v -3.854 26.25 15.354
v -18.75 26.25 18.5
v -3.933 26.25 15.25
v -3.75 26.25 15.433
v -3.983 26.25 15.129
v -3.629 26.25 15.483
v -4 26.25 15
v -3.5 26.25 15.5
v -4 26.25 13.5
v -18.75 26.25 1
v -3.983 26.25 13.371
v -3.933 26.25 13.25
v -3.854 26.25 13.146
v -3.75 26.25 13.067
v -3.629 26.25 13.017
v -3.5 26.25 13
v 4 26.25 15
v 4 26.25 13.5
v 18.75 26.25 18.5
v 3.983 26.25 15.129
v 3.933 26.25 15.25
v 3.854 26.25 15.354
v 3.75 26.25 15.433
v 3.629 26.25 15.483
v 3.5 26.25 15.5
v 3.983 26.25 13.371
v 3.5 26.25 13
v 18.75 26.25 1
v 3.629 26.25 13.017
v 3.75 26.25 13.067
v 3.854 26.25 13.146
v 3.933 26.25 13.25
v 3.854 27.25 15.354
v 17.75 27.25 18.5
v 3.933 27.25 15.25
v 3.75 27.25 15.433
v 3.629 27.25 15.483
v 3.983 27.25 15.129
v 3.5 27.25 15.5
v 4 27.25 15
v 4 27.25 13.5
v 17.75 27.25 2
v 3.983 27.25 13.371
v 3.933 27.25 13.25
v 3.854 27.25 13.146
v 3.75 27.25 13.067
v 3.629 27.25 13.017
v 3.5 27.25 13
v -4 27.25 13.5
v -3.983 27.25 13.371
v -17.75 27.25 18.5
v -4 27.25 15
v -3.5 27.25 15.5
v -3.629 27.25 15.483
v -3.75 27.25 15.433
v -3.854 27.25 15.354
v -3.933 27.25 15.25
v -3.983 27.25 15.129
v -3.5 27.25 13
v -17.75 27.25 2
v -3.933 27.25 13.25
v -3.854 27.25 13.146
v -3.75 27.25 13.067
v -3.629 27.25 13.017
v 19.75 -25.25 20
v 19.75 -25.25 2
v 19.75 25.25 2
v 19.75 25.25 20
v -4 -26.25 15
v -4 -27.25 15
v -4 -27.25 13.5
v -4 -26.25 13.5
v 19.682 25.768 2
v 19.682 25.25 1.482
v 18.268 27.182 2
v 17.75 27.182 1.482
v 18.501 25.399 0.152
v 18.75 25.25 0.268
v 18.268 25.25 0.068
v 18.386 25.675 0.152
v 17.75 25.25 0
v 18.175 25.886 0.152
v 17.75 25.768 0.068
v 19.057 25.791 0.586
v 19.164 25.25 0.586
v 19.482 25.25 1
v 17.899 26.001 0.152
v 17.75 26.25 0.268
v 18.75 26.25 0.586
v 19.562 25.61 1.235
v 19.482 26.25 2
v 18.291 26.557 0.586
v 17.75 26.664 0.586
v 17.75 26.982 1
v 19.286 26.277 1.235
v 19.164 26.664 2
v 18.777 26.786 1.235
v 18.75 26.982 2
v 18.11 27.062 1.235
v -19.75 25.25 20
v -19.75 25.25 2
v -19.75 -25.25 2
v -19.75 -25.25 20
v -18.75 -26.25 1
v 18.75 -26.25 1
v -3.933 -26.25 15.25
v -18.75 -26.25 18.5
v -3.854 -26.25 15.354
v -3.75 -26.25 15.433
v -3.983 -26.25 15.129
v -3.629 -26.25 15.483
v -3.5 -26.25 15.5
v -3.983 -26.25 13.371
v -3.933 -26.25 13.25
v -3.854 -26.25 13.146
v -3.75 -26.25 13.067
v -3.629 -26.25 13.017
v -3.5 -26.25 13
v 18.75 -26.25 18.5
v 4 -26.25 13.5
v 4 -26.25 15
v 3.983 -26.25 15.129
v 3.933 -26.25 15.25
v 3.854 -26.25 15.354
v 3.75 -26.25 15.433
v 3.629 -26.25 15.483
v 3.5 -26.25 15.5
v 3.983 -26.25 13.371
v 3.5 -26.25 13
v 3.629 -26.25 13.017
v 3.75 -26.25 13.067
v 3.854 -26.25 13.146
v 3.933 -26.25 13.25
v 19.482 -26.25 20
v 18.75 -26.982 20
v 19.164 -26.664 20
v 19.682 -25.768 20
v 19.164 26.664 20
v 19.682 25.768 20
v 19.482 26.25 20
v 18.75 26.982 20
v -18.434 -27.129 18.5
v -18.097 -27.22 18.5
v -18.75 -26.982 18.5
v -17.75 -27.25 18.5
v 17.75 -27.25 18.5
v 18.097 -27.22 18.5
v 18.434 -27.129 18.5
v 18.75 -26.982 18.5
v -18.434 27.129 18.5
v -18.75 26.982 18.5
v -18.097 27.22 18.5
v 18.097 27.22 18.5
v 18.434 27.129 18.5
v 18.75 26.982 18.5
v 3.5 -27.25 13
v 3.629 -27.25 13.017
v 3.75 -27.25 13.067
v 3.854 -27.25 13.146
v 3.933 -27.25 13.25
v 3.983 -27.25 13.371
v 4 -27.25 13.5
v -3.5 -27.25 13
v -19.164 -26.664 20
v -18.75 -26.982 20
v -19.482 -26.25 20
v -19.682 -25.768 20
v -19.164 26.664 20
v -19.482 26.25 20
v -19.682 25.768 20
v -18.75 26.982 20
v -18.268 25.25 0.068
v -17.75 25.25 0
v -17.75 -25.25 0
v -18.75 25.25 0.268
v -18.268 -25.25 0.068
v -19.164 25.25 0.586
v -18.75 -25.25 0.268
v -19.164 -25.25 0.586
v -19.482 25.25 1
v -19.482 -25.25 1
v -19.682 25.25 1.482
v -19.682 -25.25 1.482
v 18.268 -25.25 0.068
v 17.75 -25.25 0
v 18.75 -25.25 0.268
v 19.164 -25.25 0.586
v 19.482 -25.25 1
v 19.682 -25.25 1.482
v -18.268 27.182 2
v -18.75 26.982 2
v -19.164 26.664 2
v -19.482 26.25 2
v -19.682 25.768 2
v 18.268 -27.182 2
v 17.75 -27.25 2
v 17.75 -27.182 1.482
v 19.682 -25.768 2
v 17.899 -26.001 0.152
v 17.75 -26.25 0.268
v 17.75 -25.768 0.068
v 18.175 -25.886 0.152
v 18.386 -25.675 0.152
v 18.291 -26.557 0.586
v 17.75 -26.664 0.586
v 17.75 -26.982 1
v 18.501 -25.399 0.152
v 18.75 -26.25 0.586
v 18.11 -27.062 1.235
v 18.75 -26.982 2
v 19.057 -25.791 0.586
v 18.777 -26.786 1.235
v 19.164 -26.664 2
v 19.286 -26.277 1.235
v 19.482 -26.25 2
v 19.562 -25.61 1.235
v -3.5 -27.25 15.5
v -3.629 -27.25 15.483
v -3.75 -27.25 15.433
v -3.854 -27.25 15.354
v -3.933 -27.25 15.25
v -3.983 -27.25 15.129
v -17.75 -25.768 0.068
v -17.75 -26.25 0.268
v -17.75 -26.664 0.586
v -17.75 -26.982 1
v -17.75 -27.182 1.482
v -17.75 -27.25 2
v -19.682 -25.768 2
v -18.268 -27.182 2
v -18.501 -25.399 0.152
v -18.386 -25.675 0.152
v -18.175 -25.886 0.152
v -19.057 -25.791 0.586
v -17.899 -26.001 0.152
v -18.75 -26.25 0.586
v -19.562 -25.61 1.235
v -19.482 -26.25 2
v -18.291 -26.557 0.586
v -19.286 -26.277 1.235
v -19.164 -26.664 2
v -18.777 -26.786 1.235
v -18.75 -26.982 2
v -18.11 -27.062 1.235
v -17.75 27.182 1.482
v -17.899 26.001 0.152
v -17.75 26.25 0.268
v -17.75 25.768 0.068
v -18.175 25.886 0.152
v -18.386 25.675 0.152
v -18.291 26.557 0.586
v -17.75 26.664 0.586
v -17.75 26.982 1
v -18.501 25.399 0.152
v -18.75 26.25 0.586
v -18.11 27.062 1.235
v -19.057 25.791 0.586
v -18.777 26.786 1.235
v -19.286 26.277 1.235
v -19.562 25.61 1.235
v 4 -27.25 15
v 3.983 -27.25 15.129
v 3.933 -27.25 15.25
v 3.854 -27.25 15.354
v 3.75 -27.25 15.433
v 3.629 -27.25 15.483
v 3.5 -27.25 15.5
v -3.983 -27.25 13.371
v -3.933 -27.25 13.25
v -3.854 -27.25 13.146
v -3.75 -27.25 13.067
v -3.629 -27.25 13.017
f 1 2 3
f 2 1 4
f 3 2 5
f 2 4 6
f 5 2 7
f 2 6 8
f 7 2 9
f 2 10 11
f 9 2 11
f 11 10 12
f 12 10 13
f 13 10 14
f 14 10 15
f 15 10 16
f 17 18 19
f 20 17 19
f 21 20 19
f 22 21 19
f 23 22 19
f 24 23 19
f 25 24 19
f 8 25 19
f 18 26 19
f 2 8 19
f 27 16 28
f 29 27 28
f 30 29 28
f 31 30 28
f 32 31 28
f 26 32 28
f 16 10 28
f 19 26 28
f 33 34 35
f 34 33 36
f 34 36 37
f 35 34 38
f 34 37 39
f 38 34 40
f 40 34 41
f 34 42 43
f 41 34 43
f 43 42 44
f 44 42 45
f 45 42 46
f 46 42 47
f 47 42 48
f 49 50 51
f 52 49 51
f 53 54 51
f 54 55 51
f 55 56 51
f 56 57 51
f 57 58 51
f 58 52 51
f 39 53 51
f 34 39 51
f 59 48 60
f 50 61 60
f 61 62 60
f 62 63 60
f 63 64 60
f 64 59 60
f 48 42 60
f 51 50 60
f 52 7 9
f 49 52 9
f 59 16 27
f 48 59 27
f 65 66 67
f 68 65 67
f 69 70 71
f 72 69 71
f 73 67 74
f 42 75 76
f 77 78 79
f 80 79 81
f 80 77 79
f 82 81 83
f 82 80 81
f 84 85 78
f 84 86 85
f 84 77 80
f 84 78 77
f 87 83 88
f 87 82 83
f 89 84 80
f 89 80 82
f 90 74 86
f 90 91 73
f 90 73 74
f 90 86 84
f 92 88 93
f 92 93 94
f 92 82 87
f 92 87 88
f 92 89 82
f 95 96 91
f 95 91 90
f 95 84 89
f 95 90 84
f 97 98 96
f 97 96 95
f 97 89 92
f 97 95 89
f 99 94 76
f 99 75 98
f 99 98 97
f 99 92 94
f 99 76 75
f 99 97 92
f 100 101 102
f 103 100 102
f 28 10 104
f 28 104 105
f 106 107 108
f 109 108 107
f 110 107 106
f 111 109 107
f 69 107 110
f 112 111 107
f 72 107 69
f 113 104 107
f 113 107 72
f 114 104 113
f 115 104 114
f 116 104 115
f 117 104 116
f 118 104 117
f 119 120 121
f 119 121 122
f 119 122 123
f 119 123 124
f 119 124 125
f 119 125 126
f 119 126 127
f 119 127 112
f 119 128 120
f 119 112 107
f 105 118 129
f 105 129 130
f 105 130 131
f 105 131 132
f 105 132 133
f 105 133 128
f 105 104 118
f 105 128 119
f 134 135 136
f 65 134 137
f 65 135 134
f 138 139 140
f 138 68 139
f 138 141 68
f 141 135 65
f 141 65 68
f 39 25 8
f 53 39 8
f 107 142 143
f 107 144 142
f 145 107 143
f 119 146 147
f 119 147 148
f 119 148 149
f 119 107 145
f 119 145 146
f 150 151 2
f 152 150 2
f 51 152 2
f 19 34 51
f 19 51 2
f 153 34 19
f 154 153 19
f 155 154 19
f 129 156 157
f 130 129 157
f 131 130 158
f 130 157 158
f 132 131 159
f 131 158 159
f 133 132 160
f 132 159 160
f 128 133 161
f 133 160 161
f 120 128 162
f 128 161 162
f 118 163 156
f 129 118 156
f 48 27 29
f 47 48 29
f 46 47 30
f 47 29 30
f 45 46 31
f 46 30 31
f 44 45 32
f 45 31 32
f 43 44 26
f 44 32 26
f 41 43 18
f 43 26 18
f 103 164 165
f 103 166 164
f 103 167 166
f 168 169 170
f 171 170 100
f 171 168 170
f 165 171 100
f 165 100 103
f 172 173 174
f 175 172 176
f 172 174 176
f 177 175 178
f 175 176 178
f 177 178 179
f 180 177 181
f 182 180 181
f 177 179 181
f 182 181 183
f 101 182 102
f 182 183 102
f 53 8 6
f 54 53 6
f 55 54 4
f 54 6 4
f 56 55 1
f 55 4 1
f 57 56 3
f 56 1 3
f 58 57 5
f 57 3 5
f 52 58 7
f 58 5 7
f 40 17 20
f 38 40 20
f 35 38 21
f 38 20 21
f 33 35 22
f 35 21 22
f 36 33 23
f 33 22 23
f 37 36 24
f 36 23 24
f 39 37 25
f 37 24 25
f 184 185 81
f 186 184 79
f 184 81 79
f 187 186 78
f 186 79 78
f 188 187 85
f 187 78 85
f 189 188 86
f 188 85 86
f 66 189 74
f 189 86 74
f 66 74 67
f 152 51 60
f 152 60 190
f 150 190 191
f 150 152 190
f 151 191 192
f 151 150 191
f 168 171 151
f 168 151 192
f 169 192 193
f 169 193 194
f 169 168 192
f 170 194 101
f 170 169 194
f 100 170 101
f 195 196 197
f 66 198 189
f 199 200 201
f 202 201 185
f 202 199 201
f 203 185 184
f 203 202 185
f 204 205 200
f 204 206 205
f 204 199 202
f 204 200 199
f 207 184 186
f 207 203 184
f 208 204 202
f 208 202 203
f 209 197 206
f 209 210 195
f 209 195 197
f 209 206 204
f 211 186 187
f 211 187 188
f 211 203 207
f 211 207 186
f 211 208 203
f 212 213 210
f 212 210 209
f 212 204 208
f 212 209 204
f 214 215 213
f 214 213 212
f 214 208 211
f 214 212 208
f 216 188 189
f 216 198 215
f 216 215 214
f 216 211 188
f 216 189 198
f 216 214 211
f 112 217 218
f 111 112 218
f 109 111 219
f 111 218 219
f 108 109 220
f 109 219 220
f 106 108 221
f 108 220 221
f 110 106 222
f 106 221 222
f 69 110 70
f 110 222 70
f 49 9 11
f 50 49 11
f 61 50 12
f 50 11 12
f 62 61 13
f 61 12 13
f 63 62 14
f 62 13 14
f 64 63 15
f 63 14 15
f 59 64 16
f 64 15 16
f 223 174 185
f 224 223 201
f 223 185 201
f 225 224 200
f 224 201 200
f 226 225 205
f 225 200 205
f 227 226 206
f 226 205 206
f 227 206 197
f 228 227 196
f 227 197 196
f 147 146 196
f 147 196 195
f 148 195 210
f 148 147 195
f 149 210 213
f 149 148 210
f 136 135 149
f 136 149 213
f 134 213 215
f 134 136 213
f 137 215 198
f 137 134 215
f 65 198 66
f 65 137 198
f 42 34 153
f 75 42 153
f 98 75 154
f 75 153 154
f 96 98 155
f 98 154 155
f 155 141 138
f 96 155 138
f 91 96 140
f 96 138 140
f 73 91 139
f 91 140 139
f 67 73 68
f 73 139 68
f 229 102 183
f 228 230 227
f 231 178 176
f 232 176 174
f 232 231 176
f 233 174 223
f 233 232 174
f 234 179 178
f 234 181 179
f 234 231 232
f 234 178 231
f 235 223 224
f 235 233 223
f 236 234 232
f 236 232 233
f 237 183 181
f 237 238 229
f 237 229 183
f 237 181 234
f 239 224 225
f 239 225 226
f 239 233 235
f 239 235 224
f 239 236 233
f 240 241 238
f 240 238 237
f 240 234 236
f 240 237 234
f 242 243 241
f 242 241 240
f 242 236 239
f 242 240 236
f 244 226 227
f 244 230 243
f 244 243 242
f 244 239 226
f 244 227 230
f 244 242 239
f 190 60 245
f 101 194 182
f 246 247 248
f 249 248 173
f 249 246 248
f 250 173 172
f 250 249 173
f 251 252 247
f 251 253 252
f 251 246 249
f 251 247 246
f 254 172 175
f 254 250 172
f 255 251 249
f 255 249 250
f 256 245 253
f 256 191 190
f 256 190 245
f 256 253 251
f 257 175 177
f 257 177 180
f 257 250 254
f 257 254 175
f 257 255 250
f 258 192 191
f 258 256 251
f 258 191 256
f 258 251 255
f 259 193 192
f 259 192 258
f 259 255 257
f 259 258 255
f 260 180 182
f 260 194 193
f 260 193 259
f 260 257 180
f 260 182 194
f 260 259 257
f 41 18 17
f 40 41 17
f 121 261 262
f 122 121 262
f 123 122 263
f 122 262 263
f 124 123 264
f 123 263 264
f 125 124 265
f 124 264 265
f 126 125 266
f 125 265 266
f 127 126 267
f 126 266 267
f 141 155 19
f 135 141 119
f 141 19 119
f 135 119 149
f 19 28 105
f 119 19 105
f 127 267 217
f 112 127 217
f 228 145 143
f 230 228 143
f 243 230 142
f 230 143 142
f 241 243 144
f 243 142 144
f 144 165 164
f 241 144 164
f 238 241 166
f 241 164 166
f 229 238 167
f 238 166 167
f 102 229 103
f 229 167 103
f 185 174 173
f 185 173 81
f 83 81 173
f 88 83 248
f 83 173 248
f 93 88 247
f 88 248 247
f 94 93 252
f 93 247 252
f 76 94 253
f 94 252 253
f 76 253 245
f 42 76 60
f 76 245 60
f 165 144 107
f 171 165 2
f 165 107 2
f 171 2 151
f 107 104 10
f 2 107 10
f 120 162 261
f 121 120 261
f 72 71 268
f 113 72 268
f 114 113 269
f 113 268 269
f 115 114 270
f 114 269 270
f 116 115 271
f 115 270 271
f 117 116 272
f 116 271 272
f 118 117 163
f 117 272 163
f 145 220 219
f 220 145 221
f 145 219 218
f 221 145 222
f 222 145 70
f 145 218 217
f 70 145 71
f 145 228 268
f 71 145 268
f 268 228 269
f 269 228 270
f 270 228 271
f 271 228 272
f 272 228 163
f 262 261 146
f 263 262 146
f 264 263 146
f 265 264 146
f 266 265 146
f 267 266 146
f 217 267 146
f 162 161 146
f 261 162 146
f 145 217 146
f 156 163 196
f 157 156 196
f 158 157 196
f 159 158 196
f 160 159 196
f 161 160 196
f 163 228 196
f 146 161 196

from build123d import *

# Parameters (mm, degrees)
F0_W     = 37.5
F0_H     = 52.5
F1_DEPTH = 1
F0_H_2   = 1
F2_DEPTH = 18.5
F4_DEPTH = 60
F5_DEPTH = 20
F6_R     = 2
F7_R     = 2


with BuildPart() as f1:
    # F0 (on Top) → F1 (new body)
    with BuildSketch(Plane.XY):
        Rectangle(F0_W, F0_H)
    extrude(amount=F1_DEPTH)

    # F0 (on Top) → F2 (join)
    with BuildSketch(Plane.XY):
        with Locations((0, 26.75)):
            Rectangle(F0_W, F0_H_2)
        with Locations((0, -26.75)):
            Rectangle(F0_W, F0_H_2)
    extrude(amount=F2_DEPTH)

    # F3 (on face) → F4 (cut)
    with BuildSketch(Plane.XZ.offset(27.25)):
        with BuildLine():
            ThreePointArc((4, 15), (3.8535533906, 15.3535533906), (3.5, 15.5))
            Line((3.5, 15.5), (-3.5, 15.5))
            ThreePointArc((-3.5, 15.5), (-3.8535533906, 15.3535533906), (-4, 15))
            Line((-4, 15), (-4, 13.5))
            ThreePointArc((-4, 13.5), (-3.8535533906, 13.1464466094), (-3.5, 13))
            Line((-3.5, 13), (3.5, 13))
            ThreePointArc((3.5, 13), (3.8535533906, 13.1464466094), (4, 13.5))
            Line((4, 13.5), (4, 15))
        make_face()
    extrude(amount=-F4_DEPTH, mode=Mode.SUBTRACT)

    # F0 (on Top) → F5 (join)
    with BuildSketch(Plane.XY):
        Polygon((-18.75, -26.25), (-18.75, 26.25), (-18.75, 27.25), (-19.75, 27.25), (-19.75, -27.25), (-18.75, -27.25), align=None)
        Polygon((18.75, 27.25), (18.75, 26.25), (18.75, -26.25), (18.75, -27.25), (19.75, -27.25), (19.75, 27.25), align=None)
    extrude(amount=F5_DEPTH)

    # F6
    f6_edges = [f1.edges().sort_by_distance(p)[0] for p in [
        (19.75, -27.25, 10),
        (-19.75, -27.25, 10),
        (19.75, 27.25, 10),
        (-19.75, 27.25, 10),
    ]]
    fillet(f6_edges, radius=F6_R)

    # F7
    f7_edges = [f1.edges().sort_by_distance(p)[0] for p in [
        (-19.75, 0, 0),
        (-19.164214, -26.664214, 0),
        (0, -27.25, 0),
        (19.164214, -26.664214, 0),
        (19.75, 0, 0),
        (19.164214, 26.664214, 0),
        (0, 27.25, 0),
        (-19.164214, 26.664214, 0),
    ]]
    fillet(f7_edges, radius=F7_R)


solid = f1.part
